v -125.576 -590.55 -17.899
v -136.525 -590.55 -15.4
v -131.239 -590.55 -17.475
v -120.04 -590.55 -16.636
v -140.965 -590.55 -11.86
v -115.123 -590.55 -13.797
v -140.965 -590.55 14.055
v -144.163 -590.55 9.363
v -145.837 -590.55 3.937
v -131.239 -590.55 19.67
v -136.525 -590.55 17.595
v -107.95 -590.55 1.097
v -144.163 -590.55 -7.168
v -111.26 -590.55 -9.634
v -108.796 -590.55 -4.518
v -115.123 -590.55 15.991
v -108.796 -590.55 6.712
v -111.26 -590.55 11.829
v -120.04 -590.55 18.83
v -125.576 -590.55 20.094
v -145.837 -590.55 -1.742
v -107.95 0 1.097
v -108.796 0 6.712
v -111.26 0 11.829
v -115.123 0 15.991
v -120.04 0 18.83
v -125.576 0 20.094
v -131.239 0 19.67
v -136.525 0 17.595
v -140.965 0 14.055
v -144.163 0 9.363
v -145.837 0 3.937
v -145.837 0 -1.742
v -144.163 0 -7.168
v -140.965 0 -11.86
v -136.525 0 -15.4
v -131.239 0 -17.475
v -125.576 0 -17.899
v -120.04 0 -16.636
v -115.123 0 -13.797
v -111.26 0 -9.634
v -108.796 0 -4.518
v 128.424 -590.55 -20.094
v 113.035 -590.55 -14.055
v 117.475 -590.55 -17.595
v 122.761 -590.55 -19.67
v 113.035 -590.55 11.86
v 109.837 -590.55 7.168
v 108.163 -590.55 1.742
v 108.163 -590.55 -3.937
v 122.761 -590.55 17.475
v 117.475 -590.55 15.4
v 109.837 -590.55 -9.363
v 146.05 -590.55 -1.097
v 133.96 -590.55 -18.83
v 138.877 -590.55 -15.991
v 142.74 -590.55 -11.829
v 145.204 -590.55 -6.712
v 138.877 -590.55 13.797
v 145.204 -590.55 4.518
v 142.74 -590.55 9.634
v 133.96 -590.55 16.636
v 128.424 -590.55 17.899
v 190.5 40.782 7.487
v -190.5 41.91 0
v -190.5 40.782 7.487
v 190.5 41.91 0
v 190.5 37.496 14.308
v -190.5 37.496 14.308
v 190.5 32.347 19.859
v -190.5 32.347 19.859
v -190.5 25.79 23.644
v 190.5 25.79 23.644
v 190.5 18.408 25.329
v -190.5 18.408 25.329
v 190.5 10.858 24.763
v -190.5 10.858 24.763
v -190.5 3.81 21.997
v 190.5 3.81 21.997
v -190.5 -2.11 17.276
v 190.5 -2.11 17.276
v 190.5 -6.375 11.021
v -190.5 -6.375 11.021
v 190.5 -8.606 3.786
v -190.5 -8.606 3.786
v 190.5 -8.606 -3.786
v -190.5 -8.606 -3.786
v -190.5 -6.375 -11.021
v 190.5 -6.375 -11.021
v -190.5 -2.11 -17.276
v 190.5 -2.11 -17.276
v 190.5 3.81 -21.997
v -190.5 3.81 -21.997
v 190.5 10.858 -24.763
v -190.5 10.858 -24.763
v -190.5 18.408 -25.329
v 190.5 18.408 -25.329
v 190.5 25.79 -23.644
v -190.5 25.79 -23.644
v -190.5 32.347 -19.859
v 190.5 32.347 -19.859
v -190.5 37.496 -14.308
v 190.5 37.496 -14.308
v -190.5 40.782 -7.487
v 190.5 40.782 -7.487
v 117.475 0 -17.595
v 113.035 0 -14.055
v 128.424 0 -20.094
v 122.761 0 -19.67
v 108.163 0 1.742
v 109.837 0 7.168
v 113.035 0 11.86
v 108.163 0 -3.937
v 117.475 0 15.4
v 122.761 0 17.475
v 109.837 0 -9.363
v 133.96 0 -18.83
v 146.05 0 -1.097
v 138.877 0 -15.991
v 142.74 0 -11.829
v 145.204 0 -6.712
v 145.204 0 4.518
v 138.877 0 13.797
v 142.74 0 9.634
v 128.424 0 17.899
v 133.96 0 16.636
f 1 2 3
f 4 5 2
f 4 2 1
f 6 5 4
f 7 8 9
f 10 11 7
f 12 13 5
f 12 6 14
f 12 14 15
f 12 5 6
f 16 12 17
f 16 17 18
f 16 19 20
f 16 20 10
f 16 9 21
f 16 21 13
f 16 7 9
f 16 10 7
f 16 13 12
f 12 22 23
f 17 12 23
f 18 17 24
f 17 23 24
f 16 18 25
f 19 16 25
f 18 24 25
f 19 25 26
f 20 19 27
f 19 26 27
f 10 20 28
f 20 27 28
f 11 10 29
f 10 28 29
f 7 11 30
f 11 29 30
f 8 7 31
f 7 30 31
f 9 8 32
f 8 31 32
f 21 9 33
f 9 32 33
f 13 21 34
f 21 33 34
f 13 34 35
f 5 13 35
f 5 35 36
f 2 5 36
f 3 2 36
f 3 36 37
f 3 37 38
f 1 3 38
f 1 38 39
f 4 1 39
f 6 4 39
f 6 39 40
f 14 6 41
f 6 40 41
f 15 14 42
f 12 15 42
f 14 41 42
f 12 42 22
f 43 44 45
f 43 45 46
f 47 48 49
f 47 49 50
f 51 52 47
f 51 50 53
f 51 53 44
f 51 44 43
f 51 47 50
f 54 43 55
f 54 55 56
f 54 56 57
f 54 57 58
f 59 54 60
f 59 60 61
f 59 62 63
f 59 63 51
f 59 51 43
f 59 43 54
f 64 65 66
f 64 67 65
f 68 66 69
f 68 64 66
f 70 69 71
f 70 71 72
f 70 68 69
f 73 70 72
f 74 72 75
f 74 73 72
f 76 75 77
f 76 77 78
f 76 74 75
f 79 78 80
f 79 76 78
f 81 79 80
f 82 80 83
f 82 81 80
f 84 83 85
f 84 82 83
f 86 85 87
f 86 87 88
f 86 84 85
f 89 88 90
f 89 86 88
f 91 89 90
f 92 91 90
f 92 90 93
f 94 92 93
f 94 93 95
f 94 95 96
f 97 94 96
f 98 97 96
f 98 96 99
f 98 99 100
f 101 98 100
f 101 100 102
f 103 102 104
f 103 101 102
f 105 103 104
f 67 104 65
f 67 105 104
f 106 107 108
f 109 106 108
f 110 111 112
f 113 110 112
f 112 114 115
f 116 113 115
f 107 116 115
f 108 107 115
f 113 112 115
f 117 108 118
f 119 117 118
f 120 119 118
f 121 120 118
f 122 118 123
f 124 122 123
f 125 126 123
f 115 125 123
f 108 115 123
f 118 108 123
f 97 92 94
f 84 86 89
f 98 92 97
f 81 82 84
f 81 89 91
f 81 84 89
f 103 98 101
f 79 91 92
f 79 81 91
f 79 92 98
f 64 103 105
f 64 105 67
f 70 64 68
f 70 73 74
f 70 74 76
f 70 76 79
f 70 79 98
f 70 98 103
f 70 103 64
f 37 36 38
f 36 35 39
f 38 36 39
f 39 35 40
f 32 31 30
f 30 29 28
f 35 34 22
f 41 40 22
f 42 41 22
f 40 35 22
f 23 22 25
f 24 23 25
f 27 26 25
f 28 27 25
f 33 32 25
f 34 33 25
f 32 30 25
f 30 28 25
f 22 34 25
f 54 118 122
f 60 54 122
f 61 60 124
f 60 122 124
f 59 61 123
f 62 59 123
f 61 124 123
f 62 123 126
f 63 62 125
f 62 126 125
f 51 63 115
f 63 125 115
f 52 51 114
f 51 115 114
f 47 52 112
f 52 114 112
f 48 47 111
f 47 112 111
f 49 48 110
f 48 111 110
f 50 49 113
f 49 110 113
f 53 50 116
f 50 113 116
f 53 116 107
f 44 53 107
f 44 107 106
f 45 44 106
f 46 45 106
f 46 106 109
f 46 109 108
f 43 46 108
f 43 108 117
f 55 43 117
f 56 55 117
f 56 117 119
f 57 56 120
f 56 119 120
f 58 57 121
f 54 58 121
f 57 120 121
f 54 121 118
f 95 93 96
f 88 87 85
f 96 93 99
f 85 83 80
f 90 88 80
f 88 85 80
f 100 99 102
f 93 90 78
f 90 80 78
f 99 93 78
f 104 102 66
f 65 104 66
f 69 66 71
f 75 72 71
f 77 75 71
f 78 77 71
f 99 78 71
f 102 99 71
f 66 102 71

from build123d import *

# Parameters (mm, degrees)
F0_R     = 19.05
F1_DEPTH = 590.55
F2_R     = 25.4
F3_DEPTH = 190.5


with BuildPart() as f1:
    # F0 (on Front) → F1 (new body)
    with BuildSketch(Plane.XZ):
        with Locations((-127, 1.097297)):
            Circle(F0_R)
        with Locations((127, -1.097297)):
            Circle(F0_R)
    extrude(amount=F1_DEPTH)


with BuildPart() as f3:
    # F2 (on Right) → F3 (new body, symmetric)
    with BuildSketch(Plane.YZ):
        with Locations((16.51, 0)):
            Circle(F2_R)
    extrude(amount=F3_DEPTH, both=True)


solid = Compound([f1.part, f3.part])
